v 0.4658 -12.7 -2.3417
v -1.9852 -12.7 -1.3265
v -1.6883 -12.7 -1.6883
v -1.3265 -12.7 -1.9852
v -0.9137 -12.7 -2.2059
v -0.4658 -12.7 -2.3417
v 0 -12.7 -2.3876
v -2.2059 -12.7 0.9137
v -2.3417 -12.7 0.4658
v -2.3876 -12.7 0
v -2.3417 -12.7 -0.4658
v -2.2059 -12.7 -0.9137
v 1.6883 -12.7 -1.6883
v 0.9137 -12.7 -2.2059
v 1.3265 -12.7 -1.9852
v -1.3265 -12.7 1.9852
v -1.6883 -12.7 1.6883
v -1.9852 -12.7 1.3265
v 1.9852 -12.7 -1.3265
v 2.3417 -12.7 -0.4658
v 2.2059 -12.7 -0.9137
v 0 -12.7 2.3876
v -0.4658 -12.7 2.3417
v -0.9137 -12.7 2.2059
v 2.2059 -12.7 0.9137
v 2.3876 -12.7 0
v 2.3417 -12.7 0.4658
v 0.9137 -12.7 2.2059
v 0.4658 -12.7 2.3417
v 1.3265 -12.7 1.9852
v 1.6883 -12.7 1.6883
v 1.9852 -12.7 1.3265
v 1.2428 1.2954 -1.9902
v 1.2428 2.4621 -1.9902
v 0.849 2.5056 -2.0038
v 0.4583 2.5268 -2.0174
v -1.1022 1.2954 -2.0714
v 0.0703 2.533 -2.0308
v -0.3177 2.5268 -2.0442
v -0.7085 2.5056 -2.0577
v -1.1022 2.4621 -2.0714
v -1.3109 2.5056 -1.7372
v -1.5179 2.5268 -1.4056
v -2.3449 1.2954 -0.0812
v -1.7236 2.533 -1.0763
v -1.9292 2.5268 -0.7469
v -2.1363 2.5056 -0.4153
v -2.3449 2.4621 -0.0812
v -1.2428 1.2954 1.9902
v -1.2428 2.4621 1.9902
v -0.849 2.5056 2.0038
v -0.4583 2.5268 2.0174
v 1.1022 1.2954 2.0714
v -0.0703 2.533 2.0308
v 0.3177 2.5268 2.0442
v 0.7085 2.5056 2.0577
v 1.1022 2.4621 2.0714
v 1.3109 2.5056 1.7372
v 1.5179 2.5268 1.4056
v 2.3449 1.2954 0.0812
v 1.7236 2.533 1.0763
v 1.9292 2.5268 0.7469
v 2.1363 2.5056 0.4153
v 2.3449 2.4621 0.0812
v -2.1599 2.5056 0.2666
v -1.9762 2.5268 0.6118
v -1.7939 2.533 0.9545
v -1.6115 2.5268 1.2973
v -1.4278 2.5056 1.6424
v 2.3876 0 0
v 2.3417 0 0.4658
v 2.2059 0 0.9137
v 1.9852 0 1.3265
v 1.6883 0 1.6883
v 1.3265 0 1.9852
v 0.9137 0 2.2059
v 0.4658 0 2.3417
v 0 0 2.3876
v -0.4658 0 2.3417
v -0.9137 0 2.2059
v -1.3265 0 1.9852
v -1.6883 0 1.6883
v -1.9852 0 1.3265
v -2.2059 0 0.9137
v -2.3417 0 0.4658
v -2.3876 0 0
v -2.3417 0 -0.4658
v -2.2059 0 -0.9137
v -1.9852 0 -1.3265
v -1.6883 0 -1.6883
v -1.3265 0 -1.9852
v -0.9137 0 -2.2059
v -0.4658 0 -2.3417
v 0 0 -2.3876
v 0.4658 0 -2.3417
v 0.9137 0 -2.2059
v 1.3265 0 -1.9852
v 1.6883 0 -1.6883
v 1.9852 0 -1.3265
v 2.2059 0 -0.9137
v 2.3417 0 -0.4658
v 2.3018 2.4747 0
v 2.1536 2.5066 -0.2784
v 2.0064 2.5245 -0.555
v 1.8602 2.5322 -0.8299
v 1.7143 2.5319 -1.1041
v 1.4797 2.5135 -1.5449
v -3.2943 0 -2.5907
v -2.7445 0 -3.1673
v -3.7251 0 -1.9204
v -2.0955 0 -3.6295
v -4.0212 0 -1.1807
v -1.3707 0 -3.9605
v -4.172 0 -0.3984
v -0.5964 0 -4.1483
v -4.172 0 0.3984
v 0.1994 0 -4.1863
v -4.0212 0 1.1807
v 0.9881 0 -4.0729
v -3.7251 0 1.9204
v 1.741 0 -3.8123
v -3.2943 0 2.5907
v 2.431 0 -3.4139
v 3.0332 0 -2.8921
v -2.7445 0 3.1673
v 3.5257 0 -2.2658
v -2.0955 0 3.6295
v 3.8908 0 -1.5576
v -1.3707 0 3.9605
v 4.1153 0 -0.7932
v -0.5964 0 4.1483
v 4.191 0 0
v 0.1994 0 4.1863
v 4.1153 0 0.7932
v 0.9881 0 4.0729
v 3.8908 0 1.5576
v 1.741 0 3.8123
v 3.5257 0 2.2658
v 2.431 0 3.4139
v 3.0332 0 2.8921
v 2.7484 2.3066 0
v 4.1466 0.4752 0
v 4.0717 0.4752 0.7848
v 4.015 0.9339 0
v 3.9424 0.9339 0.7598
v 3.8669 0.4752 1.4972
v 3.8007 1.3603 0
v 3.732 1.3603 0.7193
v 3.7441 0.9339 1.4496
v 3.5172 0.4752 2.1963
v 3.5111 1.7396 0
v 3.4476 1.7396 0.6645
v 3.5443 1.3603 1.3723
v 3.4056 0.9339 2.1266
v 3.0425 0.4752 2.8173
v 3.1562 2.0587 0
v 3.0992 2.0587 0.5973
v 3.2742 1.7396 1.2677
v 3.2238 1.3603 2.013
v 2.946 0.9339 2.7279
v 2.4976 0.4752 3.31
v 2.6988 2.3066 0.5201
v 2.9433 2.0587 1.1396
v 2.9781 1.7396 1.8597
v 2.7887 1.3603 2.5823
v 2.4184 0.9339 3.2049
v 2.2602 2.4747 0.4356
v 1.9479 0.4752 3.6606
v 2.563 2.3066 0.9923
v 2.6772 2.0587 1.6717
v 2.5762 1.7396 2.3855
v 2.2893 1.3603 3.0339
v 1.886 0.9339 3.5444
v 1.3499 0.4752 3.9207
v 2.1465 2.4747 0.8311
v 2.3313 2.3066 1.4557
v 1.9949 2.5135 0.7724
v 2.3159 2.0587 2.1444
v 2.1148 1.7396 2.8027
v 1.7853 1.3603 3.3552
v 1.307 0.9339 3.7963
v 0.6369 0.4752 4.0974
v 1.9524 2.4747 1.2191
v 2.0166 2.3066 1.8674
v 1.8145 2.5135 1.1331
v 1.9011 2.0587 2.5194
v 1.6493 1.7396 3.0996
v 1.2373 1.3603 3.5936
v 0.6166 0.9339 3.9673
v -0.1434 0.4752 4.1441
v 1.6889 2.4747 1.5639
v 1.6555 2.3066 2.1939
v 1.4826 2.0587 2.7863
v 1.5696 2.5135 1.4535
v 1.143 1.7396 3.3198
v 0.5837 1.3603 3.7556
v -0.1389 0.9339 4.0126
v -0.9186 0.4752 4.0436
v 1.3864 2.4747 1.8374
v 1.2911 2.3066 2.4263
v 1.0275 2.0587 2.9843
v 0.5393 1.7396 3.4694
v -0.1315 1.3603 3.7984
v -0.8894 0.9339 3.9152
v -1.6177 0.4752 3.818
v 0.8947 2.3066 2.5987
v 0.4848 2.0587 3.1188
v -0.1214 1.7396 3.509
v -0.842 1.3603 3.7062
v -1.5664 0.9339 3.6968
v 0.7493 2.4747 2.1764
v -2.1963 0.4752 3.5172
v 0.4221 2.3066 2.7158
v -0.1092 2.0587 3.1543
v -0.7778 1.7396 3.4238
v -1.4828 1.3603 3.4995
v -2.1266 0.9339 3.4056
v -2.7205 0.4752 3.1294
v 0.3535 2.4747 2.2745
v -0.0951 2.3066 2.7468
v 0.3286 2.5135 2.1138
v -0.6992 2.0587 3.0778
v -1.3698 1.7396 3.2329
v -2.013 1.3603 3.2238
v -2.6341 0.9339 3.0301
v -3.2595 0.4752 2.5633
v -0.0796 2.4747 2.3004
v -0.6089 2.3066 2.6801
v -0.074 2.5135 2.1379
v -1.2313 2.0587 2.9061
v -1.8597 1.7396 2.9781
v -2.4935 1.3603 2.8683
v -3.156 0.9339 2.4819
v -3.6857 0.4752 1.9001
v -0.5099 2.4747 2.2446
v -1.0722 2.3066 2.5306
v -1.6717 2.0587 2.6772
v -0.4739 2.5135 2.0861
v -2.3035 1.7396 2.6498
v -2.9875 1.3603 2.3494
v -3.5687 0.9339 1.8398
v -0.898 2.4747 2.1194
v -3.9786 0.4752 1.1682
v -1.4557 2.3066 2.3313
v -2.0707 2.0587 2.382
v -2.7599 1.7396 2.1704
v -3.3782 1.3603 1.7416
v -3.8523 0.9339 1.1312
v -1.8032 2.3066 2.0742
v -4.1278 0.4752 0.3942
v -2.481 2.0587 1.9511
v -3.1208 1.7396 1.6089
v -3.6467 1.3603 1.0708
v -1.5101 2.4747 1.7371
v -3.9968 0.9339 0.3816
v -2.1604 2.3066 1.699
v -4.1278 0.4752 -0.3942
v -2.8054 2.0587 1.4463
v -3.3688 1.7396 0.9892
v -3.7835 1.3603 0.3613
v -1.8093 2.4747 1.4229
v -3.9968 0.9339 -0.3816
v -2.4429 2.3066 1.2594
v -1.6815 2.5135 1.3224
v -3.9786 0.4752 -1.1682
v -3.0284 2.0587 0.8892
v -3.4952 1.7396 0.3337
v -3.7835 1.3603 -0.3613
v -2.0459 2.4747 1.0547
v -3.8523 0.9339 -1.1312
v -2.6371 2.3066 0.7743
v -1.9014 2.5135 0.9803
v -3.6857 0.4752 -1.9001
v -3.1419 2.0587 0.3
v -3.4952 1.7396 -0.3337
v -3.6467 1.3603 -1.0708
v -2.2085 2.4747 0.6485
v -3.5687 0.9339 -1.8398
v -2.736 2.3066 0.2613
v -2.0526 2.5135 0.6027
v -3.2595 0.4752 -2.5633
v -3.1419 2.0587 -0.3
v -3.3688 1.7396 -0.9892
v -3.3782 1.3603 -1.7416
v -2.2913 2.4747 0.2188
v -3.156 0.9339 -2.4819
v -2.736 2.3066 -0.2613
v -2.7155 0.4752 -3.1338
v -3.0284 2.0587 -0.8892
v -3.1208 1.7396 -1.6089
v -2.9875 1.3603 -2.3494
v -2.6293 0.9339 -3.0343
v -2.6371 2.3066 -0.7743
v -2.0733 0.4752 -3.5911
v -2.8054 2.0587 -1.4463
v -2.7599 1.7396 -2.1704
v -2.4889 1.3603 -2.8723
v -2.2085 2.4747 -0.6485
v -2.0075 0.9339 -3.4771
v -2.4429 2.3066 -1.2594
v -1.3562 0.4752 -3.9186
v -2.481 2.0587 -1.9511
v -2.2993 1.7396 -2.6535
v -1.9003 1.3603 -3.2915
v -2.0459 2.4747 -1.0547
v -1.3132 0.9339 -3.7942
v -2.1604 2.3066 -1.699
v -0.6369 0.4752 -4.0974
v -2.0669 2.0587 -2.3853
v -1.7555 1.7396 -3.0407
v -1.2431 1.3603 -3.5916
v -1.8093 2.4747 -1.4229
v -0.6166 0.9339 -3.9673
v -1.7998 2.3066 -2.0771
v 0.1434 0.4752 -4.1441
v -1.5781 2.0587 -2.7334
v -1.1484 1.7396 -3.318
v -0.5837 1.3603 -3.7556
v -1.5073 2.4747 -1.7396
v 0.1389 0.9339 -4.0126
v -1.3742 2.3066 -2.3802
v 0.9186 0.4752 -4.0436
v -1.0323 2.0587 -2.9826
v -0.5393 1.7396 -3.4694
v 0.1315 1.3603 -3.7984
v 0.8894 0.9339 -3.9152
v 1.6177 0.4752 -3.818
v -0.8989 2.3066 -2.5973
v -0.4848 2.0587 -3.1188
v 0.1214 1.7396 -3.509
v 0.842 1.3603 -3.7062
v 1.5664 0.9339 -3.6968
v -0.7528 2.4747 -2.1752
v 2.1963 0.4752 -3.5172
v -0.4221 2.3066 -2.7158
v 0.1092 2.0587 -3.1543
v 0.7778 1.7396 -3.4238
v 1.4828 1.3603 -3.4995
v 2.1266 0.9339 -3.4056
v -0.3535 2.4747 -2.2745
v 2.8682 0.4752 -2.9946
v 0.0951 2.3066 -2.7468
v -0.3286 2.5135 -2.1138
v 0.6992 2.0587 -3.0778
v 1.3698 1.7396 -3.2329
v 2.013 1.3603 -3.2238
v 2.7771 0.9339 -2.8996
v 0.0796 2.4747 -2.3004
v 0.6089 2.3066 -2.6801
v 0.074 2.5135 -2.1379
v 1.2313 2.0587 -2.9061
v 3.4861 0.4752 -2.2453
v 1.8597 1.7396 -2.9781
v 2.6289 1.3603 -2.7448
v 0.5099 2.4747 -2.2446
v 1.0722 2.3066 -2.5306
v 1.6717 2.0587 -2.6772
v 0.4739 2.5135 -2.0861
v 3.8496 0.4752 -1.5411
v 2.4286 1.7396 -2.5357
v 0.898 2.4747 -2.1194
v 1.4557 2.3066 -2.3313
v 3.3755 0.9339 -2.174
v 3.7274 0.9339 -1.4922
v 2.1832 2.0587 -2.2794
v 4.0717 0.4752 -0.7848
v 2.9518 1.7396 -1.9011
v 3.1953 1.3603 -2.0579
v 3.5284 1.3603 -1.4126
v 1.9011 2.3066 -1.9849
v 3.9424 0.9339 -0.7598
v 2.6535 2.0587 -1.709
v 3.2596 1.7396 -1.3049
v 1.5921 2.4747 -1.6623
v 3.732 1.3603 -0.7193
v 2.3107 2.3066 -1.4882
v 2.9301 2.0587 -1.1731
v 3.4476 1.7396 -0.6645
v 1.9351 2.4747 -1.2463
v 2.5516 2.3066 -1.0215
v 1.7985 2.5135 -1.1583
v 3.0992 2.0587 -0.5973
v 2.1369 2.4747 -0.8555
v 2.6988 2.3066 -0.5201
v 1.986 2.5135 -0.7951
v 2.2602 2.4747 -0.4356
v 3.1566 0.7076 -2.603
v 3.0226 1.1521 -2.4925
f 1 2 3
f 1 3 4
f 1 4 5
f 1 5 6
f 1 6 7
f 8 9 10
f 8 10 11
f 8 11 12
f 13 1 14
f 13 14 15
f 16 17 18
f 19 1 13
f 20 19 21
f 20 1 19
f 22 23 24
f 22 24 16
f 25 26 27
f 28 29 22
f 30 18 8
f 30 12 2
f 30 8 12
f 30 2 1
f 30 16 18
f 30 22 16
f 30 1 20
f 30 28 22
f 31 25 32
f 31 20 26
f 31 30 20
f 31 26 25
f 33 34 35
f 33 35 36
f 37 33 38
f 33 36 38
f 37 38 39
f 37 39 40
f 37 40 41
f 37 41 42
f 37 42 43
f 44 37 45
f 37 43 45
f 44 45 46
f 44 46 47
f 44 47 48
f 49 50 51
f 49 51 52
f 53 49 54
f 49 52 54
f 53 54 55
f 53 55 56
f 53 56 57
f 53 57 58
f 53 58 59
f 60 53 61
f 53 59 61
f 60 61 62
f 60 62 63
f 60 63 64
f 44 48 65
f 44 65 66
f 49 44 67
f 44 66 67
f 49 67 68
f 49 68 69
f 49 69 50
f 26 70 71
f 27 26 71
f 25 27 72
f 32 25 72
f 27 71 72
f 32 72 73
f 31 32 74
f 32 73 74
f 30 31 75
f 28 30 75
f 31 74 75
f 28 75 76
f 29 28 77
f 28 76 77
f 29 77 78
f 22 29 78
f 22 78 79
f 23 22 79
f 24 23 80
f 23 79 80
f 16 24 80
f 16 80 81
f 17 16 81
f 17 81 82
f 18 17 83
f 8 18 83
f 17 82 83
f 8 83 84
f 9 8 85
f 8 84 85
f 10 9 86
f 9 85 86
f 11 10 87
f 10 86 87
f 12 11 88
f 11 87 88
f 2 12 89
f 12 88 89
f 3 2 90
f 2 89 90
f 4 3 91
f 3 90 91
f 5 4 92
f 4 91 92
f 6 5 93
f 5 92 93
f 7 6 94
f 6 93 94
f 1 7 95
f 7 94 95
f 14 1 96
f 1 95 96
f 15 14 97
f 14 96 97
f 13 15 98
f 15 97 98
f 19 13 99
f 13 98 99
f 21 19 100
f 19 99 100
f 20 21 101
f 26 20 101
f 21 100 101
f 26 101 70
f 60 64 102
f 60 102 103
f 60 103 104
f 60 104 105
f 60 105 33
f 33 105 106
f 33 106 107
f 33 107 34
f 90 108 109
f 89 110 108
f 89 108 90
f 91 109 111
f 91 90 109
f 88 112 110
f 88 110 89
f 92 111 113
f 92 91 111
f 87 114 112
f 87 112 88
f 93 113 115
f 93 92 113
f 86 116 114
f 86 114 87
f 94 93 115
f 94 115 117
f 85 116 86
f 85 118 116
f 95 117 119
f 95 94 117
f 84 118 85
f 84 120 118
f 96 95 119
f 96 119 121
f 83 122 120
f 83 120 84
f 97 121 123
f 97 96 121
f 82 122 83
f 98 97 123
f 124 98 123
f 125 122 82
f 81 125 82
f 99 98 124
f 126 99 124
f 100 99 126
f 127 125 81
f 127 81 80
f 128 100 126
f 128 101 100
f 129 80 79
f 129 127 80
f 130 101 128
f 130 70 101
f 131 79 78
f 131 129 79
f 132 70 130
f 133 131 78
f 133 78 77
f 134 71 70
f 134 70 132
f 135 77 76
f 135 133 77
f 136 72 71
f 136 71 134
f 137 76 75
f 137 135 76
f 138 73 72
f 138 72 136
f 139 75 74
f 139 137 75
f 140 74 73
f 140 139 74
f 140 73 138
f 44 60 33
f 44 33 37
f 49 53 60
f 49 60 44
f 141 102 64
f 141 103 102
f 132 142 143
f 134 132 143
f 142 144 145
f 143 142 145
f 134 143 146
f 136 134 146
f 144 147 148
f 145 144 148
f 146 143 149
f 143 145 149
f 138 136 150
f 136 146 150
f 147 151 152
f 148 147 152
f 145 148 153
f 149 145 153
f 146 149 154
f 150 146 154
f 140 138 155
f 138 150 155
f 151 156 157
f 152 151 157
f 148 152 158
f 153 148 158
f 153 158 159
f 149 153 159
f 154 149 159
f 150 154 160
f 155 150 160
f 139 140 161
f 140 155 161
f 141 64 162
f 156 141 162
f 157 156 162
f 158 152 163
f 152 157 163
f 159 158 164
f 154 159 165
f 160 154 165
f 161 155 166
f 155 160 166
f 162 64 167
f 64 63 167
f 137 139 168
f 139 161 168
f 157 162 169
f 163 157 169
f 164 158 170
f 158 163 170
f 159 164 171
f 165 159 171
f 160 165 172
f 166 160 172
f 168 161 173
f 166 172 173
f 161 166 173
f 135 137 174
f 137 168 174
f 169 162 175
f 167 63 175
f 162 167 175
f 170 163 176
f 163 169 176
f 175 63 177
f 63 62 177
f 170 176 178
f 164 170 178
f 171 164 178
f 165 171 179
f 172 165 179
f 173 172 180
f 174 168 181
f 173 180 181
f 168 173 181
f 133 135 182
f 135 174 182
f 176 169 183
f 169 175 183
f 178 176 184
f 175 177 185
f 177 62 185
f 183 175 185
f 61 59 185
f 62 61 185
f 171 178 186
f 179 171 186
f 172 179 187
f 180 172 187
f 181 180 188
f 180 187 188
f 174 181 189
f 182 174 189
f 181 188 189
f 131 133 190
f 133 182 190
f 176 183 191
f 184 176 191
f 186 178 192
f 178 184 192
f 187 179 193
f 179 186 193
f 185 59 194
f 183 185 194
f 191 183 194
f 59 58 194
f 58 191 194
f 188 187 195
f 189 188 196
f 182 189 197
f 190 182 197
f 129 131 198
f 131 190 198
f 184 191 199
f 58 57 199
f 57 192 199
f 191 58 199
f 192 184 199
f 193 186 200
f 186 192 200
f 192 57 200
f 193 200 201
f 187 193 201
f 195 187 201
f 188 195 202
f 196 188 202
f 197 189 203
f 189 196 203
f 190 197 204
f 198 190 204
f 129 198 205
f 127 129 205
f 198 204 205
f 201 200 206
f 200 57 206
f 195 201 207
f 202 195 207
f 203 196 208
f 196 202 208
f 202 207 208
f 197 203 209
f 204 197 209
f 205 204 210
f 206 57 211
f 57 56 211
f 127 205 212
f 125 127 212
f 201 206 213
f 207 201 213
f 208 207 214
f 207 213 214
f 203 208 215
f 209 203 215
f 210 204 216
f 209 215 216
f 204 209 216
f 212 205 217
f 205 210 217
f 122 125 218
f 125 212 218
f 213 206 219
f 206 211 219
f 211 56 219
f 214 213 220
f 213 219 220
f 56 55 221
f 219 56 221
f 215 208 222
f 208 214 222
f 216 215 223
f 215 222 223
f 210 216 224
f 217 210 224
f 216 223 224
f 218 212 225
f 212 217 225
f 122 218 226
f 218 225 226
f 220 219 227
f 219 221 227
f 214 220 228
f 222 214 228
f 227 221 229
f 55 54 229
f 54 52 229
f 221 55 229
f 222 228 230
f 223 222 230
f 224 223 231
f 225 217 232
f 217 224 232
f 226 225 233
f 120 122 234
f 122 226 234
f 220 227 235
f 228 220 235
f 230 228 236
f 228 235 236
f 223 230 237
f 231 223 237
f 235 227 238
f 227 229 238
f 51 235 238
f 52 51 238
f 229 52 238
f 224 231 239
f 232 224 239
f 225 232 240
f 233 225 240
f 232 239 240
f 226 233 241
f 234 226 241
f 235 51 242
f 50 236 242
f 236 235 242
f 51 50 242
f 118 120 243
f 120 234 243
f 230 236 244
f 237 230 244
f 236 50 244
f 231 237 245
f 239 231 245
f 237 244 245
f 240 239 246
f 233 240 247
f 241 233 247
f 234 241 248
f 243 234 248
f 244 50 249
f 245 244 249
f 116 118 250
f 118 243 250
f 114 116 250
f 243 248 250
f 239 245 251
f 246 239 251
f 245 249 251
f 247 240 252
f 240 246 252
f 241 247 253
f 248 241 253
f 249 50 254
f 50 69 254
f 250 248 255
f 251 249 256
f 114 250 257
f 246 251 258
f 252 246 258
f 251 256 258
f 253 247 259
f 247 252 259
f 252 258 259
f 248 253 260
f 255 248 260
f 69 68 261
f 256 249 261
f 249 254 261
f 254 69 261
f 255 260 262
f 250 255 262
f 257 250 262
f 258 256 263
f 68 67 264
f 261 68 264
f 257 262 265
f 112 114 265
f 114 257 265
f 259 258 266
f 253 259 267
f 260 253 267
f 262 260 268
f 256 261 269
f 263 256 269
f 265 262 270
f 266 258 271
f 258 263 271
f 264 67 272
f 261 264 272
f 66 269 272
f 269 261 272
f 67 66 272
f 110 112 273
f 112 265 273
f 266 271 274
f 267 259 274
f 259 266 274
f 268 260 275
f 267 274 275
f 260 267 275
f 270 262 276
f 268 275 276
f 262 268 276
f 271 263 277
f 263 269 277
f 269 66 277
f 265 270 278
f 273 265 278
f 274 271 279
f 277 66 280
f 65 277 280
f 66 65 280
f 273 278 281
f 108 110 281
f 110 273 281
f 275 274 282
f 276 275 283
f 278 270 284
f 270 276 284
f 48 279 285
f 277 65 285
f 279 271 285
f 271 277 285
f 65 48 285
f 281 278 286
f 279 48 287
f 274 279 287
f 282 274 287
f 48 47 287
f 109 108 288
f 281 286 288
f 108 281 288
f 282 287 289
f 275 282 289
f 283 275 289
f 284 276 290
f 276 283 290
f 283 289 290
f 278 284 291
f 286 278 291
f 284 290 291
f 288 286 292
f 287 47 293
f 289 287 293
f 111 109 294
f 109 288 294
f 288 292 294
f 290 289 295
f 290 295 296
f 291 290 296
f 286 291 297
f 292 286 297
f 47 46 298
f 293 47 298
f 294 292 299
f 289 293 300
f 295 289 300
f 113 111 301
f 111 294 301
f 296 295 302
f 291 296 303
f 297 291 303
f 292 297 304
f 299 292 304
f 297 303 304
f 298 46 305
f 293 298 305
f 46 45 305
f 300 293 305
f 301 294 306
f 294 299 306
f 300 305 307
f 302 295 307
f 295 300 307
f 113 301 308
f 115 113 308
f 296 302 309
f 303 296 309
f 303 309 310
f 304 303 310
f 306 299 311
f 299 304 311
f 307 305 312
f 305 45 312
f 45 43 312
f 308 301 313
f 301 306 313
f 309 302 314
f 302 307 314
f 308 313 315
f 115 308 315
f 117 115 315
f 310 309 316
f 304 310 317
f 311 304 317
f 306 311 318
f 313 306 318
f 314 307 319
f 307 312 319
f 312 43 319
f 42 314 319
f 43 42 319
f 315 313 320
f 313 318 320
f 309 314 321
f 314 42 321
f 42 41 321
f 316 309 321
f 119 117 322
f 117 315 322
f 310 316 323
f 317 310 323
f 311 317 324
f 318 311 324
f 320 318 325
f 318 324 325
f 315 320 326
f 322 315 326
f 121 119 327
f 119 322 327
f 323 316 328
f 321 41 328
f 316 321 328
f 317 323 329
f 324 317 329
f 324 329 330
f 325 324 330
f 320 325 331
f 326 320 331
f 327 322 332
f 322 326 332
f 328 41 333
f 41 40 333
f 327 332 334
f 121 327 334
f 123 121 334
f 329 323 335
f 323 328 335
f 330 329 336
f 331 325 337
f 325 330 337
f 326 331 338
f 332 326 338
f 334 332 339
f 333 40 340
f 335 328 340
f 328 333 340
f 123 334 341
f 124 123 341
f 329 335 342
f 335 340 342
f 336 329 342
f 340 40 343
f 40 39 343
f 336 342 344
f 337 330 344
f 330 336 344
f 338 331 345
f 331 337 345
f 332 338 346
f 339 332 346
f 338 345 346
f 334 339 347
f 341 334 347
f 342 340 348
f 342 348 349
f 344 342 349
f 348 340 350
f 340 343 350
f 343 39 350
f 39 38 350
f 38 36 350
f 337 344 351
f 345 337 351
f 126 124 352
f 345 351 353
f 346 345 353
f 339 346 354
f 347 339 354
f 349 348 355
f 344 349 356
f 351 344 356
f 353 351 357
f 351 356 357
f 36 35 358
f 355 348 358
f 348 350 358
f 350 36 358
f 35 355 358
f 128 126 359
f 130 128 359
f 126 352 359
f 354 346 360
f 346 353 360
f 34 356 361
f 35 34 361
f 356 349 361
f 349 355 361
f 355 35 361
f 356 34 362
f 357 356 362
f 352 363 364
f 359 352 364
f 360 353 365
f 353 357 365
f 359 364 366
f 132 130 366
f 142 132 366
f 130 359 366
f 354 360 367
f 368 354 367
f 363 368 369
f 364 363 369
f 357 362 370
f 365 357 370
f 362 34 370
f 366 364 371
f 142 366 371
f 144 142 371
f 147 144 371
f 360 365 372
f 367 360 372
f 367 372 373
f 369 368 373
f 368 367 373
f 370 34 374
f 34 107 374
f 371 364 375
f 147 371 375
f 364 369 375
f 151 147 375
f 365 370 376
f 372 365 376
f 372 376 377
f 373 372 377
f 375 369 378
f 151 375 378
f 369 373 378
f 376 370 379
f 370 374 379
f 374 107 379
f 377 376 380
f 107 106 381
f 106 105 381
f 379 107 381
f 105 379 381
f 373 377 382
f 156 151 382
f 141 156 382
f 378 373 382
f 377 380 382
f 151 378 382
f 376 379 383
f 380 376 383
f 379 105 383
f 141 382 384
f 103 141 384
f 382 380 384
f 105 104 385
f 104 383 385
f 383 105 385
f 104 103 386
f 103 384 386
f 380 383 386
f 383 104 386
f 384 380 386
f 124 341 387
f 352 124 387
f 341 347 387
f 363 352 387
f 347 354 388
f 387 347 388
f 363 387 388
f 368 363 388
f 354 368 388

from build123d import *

# Parameters (mm, degrees)
F0_R     = 4.191
F1_DEPTH = 2.5654
F2_R     = 2.3876
F3_DEPTH = 12.7
F5_DEPTH = 1.27


# Not quite as in the source:
# - a fillet or chamfer that OpenCascade refuses, or shapes differently, is made with other operations: its cross-section is extruded or revolved along the edge and cut away or added


with BuildPart() as f1:
    # F0 (on Front) → F1 (new body)
    with BuildSketch(Plane.XZ):
        Circle(F0_R)
    extrude(amount=-F1_DEPTH)

    # F2 (on face) → F3 (join)
    with BuildSketch(Plane.XZ):
        Circle(F2_R)
    extrude(amount=F3_DEPTH)

    # F4 (on face) → F5 (cut)
    with BuildSketch(Plane(origin=(0, 2.5654, 0), x_dir=(-1, 0, 0), z_dir=(0, 1, 0))):
        Polygon((-2.3449476001, 0.0811547043), (-1.2427558356, -1.9902068401), (1.1021917645, -2.0713615444), (2.3449476001, -0.0811547043), (1.2427558356, 1.9902068401), (-1.1021917645, 2.0713615444), align=None)
    extrude(amount=-F5_DEPTH, mode=Mode.SUBTRACT)

    # F6: fillet of radius 2.5654 on 1 edges, made by hand

    # F6_s1 → F6_t2 (revolve, cut)
    with BuildSketch(Plane.XY):
        with BuildLine():
            ThreePointArc((4.191, 0), (3.4396117365, 1.8140117365), (1.6256, 2.5654))
            Line((1.6256, 2.5654), (4.191, 2.5654))
            Line((4.191, 2.5654), (4.191, 0))
        make_face()
    revolve(axis=Axis((0, 2.5654, 0), (0, -1, 0)), mode=Mode.SUBTRACT)


solid = f1.part
